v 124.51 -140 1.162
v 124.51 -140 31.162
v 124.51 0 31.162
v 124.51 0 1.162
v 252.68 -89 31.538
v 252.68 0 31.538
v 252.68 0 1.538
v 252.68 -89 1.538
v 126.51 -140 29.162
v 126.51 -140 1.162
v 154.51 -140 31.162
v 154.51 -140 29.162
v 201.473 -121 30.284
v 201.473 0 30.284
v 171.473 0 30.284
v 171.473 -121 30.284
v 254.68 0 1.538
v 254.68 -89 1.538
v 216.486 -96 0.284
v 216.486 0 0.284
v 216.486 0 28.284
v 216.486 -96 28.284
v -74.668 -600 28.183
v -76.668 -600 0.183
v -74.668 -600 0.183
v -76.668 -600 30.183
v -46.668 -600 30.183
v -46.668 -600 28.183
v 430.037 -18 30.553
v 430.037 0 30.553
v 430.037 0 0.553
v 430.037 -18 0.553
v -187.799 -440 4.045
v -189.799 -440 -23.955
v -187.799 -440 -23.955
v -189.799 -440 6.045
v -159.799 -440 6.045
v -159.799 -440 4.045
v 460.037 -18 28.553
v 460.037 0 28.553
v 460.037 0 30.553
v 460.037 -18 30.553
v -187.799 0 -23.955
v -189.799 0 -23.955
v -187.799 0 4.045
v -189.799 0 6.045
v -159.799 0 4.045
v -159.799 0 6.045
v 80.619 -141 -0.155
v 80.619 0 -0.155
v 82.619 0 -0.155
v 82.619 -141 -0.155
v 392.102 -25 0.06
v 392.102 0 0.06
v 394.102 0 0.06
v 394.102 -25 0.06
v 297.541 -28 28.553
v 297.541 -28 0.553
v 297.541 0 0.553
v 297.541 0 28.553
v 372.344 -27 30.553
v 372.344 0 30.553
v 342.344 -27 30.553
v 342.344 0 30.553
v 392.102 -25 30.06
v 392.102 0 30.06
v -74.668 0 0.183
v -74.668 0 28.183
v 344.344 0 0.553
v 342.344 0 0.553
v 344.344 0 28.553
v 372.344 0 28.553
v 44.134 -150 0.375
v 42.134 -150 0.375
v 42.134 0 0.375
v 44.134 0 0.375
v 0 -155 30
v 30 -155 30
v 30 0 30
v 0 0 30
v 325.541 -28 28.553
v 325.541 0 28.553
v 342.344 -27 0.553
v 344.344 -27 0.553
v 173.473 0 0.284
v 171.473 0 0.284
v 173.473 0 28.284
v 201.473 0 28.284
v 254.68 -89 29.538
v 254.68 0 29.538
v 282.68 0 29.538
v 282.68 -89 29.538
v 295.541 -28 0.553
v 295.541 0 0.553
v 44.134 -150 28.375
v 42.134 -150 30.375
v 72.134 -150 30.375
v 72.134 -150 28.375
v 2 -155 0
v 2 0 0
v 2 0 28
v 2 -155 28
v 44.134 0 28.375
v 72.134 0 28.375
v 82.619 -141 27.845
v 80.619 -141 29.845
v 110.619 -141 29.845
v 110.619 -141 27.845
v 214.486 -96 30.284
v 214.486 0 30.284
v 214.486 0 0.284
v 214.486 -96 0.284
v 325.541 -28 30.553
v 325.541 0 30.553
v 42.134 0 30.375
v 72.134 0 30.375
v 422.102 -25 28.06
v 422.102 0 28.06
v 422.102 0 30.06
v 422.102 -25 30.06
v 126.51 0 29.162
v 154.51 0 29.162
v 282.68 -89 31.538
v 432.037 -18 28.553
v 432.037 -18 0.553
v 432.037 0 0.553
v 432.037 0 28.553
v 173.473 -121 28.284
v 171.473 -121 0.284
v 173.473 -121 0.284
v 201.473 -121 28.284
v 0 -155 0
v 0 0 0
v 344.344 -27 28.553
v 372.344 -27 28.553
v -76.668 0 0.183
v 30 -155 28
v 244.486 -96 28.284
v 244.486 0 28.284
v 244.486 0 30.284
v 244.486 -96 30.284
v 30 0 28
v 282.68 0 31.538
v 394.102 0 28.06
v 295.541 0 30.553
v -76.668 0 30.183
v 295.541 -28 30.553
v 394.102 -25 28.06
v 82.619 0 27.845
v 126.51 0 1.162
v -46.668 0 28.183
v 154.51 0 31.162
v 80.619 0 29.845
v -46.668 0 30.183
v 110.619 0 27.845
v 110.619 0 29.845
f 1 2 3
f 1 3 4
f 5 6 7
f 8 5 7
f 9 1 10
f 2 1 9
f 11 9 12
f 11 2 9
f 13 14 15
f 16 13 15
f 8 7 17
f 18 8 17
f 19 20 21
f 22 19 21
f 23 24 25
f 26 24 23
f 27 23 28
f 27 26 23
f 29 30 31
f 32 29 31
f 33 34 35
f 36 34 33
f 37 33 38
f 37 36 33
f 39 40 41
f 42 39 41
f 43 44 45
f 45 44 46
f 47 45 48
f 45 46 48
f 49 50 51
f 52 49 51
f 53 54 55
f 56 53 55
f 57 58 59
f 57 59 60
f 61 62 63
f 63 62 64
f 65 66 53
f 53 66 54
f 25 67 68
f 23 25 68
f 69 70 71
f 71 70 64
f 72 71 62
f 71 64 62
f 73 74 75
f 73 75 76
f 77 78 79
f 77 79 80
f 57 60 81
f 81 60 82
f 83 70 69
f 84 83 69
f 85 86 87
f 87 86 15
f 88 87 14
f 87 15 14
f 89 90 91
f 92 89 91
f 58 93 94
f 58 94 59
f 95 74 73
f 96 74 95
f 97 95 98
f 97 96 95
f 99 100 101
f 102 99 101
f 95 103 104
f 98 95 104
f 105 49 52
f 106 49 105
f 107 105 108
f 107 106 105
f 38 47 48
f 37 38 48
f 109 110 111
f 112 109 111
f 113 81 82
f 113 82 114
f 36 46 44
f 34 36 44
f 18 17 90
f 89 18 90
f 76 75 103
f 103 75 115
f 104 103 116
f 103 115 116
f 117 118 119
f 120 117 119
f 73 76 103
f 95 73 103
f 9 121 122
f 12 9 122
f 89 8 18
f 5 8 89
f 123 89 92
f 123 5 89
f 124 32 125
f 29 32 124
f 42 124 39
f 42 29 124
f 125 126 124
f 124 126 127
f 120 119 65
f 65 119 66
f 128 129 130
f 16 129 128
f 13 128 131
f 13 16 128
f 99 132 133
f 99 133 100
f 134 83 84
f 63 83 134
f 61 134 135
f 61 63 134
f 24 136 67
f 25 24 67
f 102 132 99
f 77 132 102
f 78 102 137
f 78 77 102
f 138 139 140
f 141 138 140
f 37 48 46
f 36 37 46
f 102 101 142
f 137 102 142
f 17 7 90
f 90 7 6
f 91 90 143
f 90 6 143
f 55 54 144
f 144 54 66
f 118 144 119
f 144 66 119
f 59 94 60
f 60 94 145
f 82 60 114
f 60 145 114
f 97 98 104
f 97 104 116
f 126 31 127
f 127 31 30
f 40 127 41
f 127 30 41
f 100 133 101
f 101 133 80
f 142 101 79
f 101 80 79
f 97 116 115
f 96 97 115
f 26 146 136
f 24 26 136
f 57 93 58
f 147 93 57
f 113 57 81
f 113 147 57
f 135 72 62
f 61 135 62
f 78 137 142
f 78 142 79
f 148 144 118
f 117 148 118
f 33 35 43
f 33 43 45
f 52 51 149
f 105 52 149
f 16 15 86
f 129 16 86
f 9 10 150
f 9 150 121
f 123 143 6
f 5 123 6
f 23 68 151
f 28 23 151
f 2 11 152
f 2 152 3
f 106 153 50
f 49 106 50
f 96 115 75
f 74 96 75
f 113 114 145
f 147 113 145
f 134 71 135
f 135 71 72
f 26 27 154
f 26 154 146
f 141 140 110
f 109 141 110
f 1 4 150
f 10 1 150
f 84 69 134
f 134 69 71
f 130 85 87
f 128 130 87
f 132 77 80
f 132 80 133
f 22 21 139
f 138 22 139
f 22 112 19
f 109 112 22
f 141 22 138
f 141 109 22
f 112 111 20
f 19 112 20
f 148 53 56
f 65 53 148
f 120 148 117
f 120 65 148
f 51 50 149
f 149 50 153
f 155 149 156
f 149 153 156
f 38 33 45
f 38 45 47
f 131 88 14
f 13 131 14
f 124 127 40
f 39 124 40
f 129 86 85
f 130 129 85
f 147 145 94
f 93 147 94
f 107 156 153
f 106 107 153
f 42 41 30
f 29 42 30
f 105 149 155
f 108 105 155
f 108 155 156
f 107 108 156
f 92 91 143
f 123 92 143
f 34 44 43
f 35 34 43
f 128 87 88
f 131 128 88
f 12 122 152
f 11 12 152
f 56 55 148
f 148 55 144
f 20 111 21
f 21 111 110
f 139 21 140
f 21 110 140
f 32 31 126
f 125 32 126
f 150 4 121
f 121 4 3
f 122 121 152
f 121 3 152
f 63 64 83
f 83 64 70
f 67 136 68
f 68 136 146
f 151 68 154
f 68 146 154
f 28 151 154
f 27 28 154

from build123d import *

# Parameters (mm, degrees)
F1_DEPTH  = 155
F2_DEPTH  = 150
F3_DEPTH  = 141
F4_DEPTH  = 140
F5_DEPTH  = 121
F6_DEPTH  = 96
F7_DEPTH  = 89
F8_DEPTH  = 28
F9_DEPTH  = 27
F10_DEPTH = 25
F11_DEPTH = 18
F12_DEPTH = 600
F13_DEPTH = 440


with BuildPart() as f1:
    # F0 (on Front) → F1 (new body)
    with BuildSketch(Plane.XZ):
        Polygon((0, 30), (0, 0), (2, 0), (2, 28), (30, 28), (30, 30), align=None)
    extrude(amount=F1_DEPTH)


with BuildPart() as f2:
    # F0 (on Front) → F2 (new body)
    with BuildSketch(Plane.XZ):
        Polygon((42.134417, 30.374652), (42.134417, 0.374652), (44.134417, 0.374652), (44.134417, 28.374652), (72.134417, 28.374652), (72.134417, 30.374652), align=None)
    extrude(amount=F2_DEPTH)


with BuildPart() as f3:
    # F0 (on Front) → F3 (new body)
    with BuildSketch(Plane.XZ):
        Polygon((80.618622, 29.845484), (80.618622, -0.154516), (82.618622, -0.154516), (82.618622, 27.845484), (110.618622, 27.845484), (110.618622, 29.845484), align=None)
    extrude(amount=F3_DEPTH)


with BuildPart() as f4:
    # F0 (on Front) → F4 (new body)
    with BuildSketch(Plane.XZ):
        Polygon((124.5095, 31.16221), (124.5095, 1.16221), (126.5095, 1.16221), (126.5095, 29.16221), (154.5095, 29.16221), (154.5095, 31.16221), align=None)
    extrude(amount=F4_DEPTH)


with BuildPart() as f5:
    # F0 (on Front) → F5 (new body)
    with BuildSketch(Plane.XZ):
        Polygon((171.47273, 30.284392), (171.47273, 0.284392), (173.47273, 0.284392), (173.47273, 28.284392), (201.47273, 28.284392), (201.47273, 30.284392), align=None)
    extrude(amount=F5_DEPTH)


with BuildPart() as f6:
    # F0 (on Front) → F6 (new body)
    with BuildSketch(Plane.XZ):
        Polygon((214.485781, 30.284392), (214.485781, 0.284392), (216.485781, 0.284392), (216.485781, 28.284392), (244.485781, 28.284392), (244.485781, 30.284392), align=None)
    extrude(amount=F6_DEPTH)


with BuildPart() as f7:
    # F0 (on Front) → F7 (new body)
    with BuildSketch(Plane.XZ):
        Polygon((252.679737, 31.538459), (252.679737, 1.538459), (254.679737, 1.538459), (254.679737, 29.538459), (282.679737, 29.538459), (282.679737, 31.538459), align=None)
    extrude(amount=F7_DEPTH)


with BuildPart() as f8:
    # F0 (on Front) → F8 (new body)
    with BuildSketch(Plane.XZ):
        Polygon((295.54102, 30.553142), (295.54102, 0.553142), (297.54102, 0.553142), (297.54102, 28.553142), (325.54102, 28.553142), (325.54102, 30.553142), align=None)
    extrude(amount=F8_DEPTH)


with BuildPart() as f9:
    # F0 (on Front) → F9 (new body)
    with BuildSketch(Plane.XZ):
        Polygon((342.343571, 30.553142), (342.343571, 0.553142), (344.343571, 0.553142), (344.343571, 28.553142), (372.343571, 28.553142), (372.343571, 30.553142), align=None)
    extrude(amount=F9_DEPTH)


with BuildPart() as f10:
    # F0 (on Front) → F10 (new body)
    with BuildSketch(Plane.XZ):
        Polygon((392.102064, 30.060483), (392.102064, 0.060483), (394.102064, 0.060483), (394.102064, 28.060483), (422.102064, 28.060483), (422.102064, 30.060483), align=None)
    extrude(amount=F10_DEPTH)


with BuildPart() as f11:
    # F0 (on Front) → F11 (new body)
    with BuildSketch(Plane.XZ):
        Polygon((430.036785, 30.553142), (430.036785, 0.553142), (432.036785, 0.553142), (432.036785, 28.553142), (460.036785, 28.553142), (460.036785, 30.553142), align=None)
    extrude(amount=F11_DEPTH)


with BuildPart() as f12:
    # F0 (on Front) → F12 (new body)
    with BuildSketch(Plane.XZ):
        Polygon((-76.667635, 30.182902), (-76.667635, 0.182902), (-74.667635, 0.182902), (-74.667635, 28.182902), (-46.667635, 28.182902), (-46.667635, 30.182902), align=None)
    extrude(amount=F12_DEPTH)


with BuildPart() as f13:
    # F0 (on Front) → F13 (new body)
    with BuildSketch(Plane.XZ):
        Polygon((-189.798532, 6.045131), (-189.798532, -23.954869), (-187.798532, -23.954869), (-187.798532, 4.045131), (-159.798532, 4.045131), (-159.798532, 6.045131), align=None)
    extrude(amount=F13_DEPTH)


solid = Compound([f1.part, f2.part, f3.part, f4.part, f5.part, f6.part, f7.part, f8.part, f9.part, f10.part, f11.part, f12.part, f13.part])
